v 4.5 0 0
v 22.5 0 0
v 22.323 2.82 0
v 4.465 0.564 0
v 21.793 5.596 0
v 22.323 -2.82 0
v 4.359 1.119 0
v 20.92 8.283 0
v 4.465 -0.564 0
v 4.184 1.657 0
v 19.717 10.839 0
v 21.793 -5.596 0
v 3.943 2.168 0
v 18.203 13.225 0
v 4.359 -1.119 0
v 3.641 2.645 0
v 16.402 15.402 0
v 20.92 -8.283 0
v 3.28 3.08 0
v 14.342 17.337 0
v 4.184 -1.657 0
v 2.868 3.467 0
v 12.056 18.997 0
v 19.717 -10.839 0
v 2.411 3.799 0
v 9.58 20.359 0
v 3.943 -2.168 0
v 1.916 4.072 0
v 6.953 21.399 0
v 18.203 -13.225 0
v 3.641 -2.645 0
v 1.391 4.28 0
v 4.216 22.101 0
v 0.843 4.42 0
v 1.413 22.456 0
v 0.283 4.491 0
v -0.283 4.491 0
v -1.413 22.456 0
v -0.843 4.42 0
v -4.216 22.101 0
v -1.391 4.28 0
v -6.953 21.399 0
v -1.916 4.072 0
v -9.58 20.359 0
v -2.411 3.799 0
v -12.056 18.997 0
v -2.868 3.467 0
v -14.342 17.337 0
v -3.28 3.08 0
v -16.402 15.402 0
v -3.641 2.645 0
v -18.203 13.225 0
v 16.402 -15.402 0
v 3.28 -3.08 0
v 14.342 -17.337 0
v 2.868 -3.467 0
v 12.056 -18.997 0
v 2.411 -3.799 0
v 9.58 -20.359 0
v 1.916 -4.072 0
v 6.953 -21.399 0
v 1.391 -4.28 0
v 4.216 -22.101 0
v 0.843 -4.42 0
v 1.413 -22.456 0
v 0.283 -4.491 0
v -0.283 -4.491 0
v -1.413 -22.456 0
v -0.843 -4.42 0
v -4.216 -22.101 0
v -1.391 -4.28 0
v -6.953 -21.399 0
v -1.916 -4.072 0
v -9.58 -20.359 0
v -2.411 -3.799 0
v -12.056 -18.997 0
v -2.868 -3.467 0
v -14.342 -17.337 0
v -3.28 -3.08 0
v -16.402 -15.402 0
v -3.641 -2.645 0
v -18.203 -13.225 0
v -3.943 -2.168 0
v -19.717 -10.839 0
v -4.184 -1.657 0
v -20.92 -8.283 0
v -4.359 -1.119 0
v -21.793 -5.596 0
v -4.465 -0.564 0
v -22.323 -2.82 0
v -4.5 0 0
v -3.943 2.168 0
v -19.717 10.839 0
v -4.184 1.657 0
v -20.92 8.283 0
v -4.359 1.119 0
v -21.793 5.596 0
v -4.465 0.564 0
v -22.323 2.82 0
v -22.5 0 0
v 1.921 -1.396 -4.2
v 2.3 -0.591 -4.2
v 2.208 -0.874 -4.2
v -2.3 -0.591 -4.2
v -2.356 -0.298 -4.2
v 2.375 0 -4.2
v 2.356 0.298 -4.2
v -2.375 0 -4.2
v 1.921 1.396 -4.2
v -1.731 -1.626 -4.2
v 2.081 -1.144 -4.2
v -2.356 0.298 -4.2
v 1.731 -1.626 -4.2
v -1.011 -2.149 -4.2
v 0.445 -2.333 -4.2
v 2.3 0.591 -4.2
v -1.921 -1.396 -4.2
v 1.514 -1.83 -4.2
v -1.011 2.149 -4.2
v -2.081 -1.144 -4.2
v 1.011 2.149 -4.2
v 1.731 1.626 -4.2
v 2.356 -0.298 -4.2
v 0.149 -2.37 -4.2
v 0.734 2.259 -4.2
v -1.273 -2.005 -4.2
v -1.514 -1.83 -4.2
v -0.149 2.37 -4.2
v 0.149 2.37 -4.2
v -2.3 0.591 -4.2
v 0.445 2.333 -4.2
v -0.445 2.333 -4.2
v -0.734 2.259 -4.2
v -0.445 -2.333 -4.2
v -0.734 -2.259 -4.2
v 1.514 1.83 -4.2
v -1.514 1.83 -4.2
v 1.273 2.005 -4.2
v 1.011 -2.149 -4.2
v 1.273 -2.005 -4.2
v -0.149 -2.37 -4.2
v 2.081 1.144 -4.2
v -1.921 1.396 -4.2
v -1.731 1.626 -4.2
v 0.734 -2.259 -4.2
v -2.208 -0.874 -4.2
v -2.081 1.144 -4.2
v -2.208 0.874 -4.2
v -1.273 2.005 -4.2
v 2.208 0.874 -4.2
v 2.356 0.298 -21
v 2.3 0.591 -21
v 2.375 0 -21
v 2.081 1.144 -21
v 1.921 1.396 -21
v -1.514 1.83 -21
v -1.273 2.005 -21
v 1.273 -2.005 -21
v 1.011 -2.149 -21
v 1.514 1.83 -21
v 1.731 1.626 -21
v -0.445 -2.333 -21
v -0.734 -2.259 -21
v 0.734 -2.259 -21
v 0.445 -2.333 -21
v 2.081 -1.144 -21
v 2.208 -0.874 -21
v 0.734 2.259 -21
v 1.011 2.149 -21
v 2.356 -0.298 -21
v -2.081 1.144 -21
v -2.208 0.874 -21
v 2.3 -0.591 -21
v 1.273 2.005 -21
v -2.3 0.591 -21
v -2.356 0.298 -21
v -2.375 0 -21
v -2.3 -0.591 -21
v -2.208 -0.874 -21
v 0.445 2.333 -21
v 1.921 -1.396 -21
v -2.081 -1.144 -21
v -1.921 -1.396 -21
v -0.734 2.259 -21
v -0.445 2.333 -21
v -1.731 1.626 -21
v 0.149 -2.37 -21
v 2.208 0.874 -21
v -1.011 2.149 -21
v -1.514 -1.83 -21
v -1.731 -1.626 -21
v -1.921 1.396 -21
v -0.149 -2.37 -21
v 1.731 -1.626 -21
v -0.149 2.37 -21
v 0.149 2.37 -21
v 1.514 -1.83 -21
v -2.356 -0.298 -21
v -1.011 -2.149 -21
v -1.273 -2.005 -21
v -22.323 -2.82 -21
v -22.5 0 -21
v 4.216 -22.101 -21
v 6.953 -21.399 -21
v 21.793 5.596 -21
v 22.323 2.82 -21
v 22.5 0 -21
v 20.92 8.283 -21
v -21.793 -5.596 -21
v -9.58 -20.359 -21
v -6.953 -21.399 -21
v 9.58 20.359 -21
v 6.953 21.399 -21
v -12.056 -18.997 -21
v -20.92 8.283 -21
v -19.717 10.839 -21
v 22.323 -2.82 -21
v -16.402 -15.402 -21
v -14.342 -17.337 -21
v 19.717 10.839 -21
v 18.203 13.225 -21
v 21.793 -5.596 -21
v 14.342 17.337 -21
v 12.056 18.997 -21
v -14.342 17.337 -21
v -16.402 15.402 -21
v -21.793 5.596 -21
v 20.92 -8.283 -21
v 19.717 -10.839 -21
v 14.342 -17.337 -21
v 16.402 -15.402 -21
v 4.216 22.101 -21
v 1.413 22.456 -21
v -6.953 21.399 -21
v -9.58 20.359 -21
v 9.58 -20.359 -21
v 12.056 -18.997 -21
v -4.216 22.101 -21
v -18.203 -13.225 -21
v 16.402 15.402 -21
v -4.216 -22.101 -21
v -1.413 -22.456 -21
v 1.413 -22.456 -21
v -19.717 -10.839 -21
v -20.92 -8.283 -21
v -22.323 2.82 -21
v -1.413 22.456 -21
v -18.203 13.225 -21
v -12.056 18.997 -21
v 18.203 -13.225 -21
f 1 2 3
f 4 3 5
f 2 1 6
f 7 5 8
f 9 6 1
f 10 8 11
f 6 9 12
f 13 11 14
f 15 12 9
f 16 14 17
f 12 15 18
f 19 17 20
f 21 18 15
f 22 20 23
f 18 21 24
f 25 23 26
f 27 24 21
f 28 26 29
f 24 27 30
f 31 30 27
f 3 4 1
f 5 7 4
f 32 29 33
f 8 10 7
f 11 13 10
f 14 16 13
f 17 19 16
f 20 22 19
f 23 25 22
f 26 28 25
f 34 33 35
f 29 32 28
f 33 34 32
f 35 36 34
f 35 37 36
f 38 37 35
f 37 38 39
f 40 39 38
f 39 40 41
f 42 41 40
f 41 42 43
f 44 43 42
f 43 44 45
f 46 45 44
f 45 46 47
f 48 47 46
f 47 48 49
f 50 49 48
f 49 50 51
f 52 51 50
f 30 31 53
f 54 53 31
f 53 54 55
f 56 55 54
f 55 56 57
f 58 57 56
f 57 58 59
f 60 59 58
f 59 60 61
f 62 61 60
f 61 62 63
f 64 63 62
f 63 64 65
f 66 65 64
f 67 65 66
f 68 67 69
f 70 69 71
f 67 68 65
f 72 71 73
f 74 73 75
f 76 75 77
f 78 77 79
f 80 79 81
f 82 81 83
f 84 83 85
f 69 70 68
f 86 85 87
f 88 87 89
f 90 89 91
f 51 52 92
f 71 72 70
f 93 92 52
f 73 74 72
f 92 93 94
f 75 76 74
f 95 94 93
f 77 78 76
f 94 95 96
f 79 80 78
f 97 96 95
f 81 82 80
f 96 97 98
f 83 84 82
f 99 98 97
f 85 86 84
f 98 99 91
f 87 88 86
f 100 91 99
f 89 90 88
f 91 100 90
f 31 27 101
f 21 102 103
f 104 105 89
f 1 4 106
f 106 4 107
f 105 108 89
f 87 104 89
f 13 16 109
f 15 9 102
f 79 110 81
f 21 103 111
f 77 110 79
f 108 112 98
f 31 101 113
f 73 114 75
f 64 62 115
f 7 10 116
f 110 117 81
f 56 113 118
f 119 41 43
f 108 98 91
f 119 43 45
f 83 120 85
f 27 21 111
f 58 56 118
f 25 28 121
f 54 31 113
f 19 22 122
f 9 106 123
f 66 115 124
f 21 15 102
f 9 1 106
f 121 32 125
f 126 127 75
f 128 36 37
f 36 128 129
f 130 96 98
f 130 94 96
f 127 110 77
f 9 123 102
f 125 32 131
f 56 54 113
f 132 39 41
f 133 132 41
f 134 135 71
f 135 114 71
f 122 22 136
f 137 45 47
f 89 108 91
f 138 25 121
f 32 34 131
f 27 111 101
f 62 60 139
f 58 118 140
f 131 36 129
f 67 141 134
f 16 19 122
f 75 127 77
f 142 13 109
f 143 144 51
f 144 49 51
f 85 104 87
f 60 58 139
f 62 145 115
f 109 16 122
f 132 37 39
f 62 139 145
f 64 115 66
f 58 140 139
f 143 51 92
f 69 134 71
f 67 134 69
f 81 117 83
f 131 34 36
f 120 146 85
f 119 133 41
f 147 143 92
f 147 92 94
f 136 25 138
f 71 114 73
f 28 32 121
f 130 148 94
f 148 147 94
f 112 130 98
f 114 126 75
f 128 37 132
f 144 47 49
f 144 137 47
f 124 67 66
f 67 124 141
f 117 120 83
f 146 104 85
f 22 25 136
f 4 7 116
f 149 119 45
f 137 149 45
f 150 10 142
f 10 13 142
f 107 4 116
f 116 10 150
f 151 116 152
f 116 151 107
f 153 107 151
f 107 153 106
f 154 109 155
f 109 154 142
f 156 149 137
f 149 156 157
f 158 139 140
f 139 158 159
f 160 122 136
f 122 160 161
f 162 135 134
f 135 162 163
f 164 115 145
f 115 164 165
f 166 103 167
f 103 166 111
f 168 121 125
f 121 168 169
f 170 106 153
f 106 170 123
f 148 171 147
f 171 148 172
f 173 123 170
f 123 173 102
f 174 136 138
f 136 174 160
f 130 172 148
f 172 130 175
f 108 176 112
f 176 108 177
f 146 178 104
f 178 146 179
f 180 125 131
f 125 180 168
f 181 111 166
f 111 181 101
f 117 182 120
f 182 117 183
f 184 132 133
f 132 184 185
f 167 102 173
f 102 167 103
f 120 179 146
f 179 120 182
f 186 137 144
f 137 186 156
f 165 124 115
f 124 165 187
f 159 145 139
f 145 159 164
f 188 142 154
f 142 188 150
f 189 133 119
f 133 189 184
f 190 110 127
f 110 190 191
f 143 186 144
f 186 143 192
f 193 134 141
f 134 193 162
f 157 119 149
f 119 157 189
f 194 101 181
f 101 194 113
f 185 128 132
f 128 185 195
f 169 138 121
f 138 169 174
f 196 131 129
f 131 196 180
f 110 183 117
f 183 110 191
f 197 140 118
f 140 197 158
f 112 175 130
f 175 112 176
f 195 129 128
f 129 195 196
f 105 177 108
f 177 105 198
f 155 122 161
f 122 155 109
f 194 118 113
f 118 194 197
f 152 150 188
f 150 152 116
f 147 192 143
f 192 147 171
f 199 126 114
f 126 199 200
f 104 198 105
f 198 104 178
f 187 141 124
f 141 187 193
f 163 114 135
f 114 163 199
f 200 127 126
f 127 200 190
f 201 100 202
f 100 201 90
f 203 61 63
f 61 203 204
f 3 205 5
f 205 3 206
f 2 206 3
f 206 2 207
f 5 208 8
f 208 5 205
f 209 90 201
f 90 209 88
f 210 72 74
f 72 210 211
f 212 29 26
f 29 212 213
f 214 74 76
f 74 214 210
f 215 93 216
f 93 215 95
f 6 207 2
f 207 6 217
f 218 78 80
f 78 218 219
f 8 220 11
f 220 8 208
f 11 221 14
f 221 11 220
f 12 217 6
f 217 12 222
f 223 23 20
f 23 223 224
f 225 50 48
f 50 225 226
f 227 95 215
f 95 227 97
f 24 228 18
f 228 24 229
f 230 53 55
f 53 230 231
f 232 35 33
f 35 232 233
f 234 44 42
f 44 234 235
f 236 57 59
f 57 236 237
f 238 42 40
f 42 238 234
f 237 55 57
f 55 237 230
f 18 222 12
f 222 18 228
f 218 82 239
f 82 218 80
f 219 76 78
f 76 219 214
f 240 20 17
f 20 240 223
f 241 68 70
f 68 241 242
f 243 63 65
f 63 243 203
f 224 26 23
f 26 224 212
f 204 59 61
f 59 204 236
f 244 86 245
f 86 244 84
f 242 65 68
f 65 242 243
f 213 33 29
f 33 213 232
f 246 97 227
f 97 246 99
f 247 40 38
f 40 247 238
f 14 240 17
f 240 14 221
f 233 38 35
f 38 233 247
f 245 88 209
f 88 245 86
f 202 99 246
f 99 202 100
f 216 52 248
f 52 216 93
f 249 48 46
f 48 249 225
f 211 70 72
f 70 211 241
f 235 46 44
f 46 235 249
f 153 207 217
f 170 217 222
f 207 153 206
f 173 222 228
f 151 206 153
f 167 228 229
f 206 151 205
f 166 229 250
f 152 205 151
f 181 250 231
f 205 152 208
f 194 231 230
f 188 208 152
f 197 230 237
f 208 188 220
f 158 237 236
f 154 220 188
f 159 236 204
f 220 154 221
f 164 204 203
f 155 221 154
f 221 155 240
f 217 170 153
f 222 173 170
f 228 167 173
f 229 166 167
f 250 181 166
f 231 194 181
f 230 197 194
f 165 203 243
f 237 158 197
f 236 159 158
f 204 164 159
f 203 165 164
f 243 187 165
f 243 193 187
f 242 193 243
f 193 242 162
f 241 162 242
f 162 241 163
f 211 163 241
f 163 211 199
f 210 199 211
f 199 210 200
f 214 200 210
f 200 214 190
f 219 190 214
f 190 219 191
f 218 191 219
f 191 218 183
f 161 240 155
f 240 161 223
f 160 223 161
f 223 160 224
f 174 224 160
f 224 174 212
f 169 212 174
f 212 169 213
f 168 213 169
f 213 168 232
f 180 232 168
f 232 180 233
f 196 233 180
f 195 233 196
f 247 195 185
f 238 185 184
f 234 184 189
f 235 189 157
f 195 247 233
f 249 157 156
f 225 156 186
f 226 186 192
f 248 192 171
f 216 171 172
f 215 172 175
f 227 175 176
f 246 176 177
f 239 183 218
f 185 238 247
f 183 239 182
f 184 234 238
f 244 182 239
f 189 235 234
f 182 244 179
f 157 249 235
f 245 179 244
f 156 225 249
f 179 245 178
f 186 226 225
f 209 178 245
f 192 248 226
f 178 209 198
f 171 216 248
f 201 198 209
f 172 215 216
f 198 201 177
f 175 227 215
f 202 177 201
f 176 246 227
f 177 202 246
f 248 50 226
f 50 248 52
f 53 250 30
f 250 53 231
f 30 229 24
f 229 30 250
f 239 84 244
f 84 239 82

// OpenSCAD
$fn = 50;


difference() {
	union() {
		translate(v = [0, 0, -21.0000000000]) {
			cylinder(h = 21, r = 22.5000000000);
		}
	}
	union() {
		translate(v = [0, 0, 0]) {
			rotate(a = [0, 0, 0]) {
				difference() {
					union() {
						translate(v = [0, 0, -24.0000000000]) {
							cylinder(h = 24, r = 2.2500000000);
						}
						translate(v = [0, 0, -4.2000000000]) {
							cylinder(h = 4.2000000000, r1 = 2.3750000000, r2 = 4.5000000000);
						}
						translate(v = [0, 0, -24.0000000000]) {
							cylinder(h = 24, r = 2.3750000000);
						}
						translate(v = [0, 0, -24.0000000000]) {
							cylinder(h = 24, r = 2.2500000000);
						}
					}
					union();
				}
			}
		}
	}
}
